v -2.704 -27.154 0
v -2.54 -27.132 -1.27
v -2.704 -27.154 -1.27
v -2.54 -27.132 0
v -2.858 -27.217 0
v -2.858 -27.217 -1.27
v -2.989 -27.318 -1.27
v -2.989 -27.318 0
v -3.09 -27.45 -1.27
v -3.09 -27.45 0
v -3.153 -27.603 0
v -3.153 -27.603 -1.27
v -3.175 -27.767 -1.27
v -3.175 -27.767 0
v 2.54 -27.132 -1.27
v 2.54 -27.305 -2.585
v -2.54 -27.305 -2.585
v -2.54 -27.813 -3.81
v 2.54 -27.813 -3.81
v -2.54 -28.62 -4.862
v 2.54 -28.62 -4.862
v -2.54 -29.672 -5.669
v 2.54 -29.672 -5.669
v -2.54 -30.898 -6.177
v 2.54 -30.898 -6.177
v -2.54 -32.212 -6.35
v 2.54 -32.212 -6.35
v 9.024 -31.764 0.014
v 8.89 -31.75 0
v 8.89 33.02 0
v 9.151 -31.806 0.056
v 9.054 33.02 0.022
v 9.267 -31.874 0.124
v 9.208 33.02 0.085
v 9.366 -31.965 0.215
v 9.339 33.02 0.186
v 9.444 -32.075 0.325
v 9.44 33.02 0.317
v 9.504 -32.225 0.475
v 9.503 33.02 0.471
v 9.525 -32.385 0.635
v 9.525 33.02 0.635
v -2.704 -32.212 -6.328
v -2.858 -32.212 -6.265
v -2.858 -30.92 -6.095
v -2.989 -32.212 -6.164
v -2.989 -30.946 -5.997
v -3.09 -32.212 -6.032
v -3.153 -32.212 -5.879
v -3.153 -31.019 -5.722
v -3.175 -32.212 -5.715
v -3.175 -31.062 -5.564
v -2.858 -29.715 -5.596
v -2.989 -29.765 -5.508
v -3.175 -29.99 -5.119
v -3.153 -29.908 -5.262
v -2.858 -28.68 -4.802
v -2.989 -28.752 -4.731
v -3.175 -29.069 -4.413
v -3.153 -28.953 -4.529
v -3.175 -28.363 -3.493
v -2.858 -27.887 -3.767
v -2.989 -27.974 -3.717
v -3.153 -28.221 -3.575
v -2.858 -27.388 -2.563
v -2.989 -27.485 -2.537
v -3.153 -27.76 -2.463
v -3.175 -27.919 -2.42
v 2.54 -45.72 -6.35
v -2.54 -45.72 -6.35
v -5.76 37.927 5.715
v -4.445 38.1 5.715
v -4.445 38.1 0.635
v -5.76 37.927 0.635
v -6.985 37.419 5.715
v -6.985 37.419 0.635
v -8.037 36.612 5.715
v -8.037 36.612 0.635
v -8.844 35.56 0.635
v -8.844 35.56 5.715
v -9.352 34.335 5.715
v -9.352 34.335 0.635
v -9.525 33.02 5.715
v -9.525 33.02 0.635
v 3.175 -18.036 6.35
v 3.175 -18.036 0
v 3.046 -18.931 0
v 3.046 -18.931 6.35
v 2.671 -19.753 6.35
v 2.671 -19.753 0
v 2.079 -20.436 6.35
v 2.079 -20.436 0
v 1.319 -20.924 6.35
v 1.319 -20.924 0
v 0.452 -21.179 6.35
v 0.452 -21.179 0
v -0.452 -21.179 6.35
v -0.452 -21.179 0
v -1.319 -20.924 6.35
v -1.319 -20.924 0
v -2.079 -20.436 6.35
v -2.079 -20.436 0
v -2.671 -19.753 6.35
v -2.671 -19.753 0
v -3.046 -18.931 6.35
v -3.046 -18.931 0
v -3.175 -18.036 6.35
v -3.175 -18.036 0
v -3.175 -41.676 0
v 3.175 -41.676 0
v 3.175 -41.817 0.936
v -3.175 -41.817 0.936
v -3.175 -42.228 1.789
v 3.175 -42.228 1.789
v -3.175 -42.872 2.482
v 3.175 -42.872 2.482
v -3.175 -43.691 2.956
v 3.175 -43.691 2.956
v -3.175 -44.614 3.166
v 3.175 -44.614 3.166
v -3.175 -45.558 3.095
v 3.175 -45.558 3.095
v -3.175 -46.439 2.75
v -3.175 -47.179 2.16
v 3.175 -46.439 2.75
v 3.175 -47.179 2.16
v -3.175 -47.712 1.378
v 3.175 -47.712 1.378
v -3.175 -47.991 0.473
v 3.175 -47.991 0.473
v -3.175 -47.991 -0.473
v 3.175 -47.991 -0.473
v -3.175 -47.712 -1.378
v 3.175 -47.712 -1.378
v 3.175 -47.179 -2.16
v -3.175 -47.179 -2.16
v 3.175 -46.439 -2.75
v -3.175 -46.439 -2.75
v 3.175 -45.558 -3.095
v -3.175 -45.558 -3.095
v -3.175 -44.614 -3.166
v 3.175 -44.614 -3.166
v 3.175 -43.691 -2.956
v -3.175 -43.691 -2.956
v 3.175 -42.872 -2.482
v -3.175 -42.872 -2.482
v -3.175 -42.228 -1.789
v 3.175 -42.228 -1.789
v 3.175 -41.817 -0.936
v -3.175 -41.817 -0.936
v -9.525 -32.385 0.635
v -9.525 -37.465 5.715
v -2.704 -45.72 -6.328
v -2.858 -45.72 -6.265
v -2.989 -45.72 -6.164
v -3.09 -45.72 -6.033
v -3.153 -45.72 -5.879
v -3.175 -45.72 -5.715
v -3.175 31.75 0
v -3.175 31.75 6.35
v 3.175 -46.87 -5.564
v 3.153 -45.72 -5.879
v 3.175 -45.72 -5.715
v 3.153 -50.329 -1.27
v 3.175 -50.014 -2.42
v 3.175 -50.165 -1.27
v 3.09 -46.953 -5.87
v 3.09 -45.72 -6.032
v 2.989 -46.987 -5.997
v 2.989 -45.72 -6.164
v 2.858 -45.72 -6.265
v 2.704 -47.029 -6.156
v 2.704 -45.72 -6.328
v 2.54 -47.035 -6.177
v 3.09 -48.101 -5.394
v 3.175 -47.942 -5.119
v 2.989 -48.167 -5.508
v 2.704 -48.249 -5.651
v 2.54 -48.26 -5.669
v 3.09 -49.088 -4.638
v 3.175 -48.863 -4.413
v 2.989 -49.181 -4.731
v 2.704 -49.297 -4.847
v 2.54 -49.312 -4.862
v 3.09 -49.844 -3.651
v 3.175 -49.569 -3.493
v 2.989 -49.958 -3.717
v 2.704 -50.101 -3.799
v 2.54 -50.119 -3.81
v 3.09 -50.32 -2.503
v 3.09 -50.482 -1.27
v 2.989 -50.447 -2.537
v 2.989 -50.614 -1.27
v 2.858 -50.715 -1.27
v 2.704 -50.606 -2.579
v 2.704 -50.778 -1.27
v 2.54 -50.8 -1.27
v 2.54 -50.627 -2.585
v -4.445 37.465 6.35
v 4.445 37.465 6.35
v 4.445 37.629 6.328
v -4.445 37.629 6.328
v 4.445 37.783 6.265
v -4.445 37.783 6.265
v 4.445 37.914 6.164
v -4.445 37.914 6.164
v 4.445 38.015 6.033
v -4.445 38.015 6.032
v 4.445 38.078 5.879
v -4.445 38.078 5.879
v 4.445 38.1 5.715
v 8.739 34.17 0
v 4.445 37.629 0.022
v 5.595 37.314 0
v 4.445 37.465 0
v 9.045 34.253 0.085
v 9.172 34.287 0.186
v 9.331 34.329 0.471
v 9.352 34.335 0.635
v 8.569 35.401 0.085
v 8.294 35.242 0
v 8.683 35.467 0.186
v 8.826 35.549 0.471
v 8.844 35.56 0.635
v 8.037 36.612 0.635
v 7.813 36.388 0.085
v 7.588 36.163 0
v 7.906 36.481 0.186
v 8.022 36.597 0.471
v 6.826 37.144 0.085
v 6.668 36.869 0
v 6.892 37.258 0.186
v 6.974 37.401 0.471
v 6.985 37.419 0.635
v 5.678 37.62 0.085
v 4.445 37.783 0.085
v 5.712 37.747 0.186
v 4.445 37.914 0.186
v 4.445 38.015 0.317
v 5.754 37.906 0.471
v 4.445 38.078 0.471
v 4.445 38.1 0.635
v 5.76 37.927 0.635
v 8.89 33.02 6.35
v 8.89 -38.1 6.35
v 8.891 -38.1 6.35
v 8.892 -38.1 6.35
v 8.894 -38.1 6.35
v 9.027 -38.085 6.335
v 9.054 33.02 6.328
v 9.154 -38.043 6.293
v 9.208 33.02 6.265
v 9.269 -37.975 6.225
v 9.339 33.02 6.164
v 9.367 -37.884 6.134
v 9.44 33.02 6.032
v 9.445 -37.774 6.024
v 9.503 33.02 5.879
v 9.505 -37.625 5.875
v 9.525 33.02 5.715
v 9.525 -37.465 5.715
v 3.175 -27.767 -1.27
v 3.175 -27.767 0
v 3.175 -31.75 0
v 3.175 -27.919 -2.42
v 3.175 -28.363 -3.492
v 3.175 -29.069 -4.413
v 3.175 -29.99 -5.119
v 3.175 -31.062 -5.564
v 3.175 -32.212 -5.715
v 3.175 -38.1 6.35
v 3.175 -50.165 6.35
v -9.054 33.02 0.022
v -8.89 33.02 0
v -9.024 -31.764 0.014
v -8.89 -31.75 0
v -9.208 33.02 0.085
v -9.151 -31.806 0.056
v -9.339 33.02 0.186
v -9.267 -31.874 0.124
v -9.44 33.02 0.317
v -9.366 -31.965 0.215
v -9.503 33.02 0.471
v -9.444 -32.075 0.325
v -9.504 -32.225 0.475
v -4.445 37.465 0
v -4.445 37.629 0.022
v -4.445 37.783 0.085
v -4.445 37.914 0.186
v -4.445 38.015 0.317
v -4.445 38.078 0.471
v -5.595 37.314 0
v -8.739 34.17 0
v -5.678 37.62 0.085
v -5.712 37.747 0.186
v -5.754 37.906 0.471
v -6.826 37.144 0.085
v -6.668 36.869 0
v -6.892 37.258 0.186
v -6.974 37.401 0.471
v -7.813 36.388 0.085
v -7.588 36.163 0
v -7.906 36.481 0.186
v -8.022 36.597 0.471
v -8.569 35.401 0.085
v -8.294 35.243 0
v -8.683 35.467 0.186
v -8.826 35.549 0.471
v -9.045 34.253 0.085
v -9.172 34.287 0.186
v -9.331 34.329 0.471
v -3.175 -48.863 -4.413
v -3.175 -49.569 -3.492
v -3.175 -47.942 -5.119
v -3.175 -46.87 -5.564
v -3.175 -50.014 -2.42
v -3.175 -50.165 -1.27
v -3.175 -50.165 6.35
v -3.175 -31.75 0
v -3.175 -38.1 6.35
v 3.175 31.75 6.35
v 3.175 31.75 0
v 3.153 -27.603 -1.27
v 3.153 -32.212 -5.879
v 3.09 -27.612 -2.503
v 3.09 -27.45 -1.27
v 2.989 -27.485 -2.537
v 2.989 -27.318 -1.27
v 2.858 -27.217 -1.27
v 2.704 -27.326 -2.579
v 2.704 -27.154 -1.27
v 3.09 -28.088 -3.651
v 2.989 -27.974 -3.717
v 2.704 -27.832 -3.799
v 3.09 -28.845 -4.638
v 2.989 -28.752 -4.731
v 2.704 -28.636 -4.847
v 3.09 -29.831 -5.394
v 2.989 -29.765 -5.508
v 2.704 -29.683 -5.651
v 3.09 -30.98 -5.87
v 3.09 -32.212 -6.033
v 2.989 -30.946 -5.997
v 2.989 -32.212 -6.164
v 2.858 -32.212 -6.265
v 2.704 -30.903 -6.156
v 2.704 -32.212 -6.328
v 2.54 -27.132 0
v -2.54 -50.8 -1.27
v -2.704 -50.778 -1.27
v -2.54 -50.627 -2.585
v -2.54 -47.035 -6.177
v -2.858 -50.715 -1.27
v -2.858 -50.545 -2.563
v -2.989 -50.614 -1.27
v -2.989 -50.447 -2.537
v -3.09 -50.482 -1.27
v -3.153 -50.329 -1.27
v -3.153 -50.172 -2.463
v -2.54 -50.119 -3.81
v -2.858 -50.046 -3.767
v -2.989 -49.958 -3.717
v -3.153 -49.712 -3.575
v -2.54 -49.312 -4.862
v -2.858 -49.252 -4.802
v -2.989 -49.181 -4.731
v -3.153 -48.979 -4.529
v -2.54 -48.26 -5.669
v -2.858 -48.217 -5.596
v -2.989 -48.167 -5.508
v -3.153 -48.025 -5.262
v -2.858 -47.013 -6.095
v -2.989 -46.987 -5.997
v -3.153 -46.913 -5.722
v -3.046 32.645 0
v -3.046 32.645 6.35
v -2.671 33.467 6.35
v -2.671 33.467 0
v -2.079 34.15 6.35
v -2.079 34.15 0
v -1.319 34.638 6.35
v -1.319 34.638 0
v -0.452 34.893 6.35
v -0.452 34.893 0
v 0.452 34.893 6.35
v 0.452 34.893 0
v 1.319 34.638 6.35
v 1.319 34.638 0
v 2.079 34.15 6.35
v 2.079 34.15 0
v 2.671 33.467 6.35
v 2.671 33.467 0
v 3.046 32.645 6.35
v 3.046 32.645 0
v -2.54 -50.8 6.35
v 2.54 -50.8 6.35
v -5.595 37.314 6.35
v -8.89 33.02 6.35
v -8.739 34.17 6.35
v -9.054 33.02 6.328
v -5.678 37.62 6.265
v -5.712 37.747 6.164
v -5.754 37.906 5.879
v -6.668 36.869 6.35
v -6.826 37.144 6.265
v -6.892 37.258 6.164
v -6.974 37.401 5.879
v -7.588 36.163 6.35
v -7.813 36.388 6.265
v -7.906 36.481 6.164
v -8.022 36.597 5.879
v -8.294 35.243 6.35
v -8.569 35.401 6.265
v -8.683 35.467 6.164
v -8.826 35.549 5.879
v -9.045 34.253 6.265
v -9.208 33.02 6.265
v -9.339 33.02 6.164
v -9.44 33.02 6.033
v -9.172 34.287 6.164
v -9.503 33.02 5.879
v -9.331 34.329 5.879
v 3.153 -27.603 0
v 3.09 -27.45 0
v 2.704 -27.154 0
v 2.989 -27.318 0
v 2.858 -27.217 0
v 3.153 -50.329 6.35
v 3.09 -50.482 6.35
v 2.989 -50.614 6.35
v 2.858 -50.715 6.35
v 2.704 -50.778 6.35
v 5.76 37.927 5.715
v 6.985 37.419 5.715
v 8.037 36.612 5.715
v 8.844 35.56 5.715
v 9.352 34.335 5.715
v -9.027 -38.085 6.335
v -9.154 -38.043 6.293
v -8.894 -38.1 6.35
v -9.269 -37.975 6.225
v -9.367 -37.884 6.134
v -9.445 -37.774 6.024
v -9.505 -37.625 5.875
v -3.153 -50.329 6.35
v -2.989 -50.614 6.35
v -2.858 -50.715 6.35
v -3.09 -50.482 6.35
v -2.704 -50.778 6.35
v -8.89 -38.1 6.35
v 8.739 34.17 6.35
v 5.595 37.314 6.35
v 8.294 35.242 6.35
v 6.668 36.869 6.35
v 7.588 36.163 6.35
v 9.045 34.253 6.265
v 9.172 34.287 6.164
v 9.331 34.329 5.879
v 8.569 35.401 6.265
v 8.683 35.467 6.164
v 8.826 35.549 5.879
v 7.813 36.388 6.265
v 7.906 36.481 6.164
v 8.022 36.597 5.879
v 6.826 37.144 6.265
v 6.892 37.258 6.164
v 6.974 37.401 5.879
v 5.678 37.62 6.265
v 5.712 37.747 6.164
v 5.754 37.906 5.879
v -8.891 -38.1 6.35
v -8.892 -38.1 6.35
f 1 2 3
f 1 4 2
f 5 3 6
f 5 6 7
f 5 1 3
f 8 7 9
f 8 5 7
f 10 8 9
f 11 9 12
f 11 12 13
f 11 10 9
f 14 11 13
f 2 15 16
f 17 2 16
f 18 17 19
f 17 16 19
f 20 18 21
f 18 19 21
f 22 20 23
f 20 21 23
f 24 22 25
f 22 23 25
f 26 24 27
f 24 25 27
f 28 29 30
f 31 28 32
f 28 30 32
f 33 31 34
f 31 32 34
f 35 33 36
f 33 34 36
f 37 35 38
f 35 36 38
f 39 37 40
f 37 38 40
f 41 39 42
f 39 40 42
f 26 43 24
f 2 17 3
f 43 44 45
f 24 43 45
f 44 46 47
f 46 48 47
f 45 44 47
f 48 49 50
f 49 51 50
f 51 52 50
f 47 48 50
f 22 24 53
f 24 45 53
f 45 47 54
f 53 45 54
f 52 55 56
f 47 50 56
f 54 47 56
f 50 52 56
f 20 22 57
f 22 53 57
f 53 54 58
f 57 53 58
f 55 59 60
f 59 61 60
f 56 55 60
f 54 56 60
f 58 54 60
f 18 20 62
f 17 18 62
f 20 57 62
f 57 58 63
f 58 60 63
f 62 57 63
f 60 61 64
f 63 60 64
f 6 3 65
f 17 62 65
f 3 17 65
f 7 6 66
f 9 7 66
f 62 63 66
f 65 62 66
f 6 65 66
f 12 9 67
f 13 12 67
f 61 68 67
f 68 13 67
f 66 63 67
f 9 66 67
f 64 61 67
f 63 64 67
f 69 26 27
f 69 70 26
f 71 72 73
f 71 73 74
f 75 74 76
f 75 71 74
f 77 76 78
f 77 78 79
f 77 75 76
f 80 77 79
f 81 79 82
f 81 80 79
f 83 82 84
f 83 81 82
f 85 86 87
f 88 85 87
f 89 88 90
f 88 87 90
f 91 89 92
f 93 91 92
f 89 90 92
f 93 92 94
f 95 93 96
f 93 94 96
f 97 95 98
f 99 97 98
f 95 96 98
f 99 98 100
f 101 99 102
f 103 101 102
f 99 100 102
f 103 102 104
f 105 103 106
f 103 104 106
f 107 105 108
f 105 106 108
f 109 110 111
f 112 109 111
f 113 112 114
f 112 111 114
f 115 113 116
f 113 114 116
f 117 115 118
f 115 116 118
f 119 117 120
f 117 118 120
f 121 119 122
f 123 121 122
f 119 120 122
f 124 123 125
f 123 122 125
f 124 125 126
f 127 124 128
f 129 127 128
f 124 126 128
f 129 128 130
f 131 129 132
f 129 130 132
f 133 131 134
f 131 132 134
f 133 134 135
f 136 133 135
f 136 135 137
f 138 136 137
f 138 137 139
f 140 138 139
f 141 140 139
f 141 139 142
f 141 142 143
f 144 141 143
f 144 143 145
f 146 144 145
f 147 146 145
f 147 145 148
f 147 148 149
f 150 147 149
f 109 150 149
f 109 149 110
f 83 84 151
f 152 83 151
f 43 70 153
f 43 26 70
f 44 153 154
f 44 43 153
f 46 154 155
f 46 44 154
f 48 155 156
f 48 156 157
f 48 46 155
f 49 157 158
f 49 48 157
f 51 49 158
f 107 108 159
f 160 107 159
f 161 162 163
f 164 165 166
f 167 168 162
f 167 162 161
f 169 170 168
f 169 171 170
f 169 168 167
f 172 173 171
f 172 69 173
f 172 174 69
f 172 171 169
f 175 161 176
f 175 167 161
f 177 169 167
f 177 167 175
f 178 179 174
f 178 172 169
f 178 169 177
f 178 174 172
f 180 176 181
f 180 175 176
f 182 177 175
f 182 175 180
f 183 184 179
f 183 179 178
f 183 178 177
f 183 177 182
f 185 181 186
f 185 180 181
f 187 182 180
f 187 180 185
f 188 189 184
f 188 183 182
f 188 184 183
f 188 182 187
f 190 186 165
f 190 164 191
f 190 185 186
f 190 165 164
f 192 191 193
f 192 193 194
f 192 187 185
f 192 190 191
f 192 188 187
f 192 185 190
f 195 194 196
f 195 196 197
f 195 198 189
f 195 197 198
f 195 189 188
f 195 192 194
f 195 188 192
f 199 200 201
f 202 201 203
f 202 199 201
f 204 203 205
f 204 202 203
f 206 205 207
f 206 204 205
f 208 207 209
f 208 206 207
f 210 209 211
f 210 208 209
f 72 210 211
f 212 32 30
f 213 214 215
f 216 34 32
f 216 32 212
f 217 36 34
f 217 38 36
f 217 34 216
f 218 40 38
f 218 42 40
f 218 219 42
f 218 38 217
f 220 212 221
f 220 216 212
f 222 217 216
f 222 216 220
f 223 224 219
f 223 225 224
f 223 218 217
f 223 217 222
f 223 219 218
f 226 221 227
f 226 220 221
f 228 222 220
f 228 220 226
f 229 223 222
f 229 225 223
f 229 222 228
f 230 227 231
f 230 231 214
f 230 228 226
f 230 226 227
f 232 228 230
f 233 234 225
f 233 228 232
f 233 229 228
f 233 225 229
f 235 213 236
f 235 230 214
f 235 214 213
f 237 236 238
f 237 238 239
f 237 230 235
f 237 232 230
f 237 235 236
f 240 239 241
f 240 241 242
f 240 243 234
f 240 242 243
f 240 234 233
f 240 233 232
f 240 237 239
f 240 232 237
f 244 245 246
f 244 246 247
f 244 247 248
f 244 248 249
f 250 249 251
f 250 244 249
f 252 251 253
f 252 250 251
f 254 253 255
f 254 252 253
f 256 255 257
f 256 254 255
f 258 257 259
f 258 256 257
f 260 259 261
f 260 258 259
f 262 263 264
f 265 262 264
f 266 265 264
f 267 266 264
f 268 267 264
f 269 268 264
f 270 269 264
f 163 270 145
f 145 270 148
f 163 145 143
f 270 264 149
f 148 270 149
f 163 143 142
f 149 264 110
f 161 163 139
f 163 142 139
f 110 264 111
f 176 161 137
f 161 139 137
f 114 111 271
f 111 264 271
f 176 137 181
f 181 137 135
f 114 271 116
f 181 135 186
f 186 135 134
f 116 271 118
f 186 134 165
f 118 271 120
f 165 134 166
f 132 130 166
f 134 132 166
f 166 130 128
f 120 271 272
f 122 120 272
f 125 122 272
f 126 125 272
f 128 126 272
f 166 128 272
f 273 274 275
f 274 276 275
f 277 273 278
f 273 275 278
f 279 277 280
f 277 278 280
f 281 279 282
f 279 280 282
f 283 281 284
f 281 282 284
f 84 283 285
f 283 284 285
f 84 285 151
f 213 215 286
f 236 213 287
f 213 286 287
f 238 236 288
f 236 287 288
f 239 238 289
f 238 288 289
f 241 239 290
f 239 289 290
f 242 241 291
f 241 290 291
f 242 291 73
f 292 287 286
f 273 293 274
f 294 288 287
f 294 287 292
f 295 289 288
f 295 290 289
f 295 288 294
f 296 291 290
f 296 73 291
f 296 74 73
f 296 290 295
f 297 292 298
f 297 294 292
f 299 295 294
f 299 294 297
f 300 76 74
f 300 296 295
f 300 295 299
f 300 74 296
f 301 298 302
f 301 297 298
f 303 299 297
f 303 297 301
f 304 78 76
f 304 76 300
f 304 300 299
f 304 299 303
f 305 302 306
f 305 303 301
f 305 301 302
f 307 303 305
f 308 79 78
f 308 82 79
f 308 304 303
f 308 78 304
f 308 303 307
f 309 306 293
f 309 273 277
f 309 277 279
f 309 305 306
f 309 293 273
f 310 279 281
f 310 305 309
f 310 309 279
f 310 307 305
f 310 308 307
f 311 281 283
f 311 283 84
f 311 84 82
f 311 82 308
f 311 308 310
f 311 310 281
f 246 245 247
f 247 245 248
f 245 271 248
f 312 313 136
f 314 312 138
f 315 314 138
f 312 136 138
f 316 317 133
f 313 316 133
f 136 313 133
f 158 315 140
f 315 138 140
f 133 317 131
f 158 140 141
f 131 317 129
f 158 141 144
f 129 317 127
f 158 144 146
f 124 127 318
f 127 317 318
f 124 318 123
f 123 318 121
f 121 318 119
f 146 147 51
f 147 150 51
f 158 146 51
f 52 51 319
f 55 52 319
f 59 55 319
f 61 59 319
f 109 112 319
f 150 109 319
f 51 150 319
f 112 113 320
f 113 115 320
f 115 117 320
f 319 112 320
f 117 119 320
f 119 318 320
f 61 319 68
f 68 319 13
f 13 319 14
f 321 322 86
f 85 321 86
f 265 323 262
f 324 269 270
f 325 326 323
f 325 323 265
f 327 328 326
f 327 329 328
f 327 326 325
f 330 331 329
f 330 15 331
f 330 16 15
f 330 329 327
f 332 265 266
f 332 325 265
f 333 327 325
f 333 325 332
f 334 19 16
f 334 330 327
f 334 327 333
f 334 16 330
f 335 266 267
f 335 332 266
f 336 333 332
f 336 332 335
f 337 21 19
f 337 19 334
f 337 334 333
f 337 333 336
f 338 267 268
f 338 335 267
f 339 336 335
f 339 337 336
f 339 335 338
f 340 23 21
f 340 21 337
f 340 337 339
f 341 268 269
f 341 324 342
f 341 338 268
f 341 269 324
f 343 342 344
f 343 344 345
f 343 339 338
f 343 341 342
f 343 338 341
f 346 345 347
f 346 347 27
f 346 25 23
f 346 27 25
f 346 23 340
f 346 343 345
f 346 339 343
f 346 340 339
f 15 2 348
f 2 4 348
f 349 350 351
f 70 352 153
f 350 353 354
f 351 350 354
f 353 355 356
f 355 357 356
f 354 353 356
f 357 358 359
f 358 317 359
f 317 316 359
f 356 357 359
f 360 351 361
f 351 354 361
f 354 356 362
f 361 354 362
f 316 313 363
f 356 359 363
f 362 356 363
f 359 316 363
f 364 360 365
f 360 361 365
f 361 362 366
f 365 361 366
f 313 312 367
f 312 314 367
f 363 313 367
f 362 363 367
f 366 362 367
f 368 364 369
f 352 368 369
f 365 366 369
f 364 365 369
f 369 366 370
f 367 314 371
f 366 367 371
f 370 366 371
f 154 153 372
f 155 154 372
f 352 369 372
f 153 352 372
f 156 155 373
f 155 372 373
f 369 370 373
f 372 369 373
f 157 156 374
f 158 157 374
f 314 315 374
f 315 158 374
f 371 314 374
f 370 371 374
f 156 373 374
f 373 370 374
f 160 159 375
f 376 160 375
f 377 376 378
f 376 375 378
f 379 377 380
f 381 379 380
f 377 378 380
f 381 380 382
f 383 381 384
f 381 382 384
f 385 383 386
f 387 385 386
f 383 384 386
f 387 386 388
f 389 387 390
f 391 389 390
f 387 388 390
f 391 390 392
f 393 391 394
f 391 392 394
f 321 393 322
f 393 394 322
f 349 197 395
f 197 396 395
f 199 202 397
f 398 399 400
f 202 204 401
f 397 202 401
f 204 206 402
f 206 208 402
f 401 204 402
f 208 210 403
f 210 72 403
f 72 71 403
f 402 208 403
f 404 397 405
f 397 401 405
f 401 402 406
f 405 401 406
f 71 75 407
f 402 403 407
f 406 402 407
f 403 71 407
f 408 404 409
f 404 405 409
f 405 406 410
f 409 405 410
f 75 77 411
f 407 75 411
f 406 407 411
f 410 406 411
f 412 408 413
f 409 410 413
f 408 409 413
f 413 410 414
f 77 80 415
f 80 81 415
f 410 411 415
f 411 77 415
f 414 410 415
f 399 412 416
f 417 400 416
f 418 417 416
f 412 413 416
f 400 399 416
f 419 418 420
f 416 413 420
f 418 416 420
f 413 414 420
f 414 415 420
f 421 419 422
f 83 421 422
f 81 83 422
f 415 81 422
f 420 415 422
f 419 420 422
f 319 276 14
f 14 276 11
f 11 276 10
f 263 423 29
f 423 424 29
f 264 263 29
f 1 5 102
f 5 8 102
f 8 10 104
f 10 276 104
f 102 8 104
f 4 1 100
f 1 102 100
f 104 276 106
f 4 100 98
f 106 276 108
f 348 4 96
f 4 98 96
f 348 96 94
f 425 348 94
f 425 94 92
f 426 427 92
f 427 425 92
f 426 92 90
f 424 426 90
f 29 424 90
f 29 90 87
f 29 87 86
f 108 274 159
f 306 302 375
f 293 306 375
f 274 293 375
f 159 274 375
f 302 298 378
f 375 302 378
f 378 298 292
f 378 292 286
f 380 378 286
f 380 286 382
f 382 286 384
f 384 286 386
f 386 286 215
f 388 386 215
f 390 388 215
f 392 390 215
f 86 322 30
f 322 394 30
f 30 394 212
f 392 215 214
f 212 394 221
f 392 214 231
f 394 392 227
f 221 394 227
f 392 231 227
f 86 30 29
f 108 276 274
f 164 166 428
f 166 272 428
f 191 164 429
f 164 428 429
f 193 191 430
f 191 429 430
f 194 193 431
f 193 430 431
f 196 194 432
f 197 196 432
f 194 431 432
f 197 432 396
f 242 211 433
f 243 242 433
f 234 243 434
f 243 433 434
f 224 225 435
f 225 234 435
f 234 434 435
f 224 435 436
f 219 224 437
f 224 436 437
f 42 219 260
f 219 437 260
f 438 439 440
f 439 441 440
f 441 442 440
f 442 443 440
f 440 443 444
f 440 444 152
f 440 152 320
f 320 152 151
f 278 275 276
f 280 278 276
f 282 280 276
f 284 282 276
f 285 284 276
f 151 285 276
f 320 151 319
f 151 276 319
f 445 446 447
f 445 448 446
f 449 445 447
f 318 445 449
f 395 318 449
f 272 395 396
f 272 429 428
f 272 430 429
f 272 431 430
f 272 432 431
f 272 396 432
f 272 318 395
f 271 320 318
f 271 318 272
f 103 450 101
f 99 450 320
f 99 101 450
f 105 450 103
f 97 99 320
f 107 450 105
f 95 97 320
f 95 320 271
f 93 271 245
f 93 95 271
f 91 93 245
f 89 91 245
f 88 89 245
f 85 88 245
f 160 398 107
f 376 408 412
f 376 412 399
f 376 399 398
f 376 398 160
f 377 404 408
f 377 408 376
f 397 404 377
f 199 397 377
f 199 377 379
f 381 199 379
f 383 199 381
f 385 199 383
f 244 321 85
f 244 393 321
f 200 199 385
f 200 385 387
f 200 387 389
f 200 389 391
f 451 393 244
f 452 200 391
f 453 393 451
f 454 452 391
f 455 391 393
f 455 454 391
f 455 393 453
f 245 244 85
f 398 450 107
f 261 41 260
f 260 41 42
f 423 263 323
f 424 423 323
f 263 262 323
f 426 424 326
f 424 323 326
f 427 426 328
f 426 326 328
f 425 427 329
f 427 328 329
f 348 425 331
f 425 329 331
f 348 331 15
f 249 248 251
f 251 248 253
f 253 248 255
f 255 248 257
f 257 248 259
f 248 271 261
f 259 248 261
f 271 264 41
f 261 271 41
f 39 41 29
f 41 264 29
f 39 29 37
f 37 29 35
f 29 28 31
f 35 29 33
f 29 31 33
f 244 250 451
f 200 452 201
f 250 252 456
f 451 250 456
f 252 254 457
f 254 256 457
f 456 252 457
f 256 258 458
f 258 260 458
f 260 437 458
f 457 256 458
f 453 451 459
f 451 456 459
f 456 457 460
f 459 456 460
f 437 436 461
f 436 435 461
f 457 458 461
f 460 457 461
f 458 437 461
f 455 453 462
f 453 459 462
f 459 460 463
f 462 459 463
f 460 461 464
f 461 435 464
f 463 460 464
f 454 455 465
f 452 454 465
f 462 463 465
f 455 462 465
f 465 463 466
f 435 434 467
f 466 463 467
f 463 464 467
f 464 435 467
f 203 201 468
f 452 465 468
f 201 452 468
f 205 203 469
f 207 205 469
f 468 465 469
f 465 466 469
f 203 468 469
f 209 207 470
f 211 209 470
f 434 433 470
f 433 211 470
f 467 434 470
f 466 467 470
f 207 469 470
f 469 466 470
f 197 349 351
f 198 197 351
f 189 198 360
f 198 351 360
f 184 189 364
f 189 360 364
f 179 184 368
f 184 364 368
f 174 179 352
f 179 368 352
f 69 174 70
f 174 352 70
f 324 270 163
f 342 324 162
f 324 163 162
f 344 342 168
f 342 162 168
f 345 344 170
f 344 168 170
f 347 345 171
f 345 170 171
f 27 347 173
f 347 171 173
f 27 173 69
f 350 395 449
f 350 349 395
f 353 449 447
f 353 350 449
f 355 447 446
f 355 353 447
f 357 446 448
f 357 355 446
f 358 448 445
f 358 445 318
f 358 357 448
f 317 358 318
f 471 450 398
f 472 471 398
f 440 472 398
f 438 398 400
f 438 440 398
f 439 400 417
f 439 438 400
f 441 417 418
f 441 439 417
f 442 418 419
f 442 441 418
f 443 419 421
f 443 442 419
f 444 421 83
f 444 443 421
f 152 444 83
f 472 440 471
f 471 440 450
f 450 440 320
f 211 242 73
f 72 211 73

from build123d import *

# Parameters (mm, degrees)
F1_DEPTH = 6.35
F3_DEPTH = 6.35
F5_D     = 6.35
F6_R     = 5.08
F7_R     = 5.08
F8_SIZE  = 6.34999
F9_R     = 5.08
F10_R    = 0.635


# Not quite as in the source:
# - a fillet or chamfer is up to 0.001 mm smaller than in the source, because OpenCascade refuses the exact size
# - a feature names something its author has since deleted; it is built from what else it names


with BuildPart() as f1:
    # F0 (on Top) → F1 (new body)
    with BuildSketch(Plane.XY):
        Polygon((9.525, 38.1), (-9.525, 38.1), (-9.525, -38.1), (-3.175, -38.1), (-3.175, -50.8), (3.175, -50.8), (3.175, -38.1), (9.525, -38.1), align=None)
        with BuildLine():
            ThreePointArc((3.175, -18.0363506079), (0, -21.2113506079), (-3.175, -18.0363506079))
            Line((-3.175, -18.0363506079), (-3.175, 31.75))
            ThreePointArc((-3.175, 31.75), (0, 34.925), (3.175, 31.75))
            Line((3.175, 31.75), (3.175, -18.0363506079))
        make_face(mode=Mode.SUBTRACT)
    extrude(amount=F1_DEPTH)

    # F2 (on face) → F3 (join)
    with BuildSketch(Plane(origin=(0, 0, 0), x_dir=(1, 0, 0), z_dir=(0, 0, -1))):
        Polygon((3.175, 38.1), (3.175, 50.8), (-3.175, 50.8), (-3.175, 38.1), (-3.175, 27.132358402), (3.175, 27.132358402), align=None)
    extrude(amount=F3_DEPTH)

    # F5 (through all)
    with Locations(Plane(origin=(-3.175, 0, 0), x_dir=(0, -1, 0), z_dir=(-1, 0, 0))):
        with Locations((44.8514223099, 0)):
            Hole(F5_D / 2)

    # F6
    f6_edges = [f1.edges().sort_by_distance(p)[0] for p in [
        (0, -50.8, -6.35),
    ]]
    fillet(f6_edges, radius=F6_R)

    # F7
    f7_edges = [f1.edges().sort_by_distance(p)[0] for p in [
        (-9.525, 38.1, 3.175),
        (9.525, 38.1, 3.175),
    ]]
    fillet(f7_edges, radius=F7_R)

    # F8 (size 6.35 in the source; OpenCascade refuses exactly that, so slightly less here)
    f8_edges = [f1.edges().sort_by_distance(p)[0] for p in [
        (6.35, -38.1, 0),
        (-6.35, -38.1, 0),
    ]]
    chamfer(f8_edges, length=F8_SIZE)

    # F9
    f9_edges = [f1.edges().sort_by_distance(p)[0] for p in [
        (0, -27.132358, -6.35),
    ]]
    fillet(f9_edges, radius=F9_R)

    # F10
    f10_edges = [f1.edges().sort_by_distance(p)[0] for p in [
        (-3.175, -50.8, 2.54),
        (3.175, -50.8, 2.54),
        (-9.525, 0.634995, 0),
        (9.525, -2.54, 6.35),
    ]]
    fillet(f10_edges, radius=F10_R)


solid = f1.part
